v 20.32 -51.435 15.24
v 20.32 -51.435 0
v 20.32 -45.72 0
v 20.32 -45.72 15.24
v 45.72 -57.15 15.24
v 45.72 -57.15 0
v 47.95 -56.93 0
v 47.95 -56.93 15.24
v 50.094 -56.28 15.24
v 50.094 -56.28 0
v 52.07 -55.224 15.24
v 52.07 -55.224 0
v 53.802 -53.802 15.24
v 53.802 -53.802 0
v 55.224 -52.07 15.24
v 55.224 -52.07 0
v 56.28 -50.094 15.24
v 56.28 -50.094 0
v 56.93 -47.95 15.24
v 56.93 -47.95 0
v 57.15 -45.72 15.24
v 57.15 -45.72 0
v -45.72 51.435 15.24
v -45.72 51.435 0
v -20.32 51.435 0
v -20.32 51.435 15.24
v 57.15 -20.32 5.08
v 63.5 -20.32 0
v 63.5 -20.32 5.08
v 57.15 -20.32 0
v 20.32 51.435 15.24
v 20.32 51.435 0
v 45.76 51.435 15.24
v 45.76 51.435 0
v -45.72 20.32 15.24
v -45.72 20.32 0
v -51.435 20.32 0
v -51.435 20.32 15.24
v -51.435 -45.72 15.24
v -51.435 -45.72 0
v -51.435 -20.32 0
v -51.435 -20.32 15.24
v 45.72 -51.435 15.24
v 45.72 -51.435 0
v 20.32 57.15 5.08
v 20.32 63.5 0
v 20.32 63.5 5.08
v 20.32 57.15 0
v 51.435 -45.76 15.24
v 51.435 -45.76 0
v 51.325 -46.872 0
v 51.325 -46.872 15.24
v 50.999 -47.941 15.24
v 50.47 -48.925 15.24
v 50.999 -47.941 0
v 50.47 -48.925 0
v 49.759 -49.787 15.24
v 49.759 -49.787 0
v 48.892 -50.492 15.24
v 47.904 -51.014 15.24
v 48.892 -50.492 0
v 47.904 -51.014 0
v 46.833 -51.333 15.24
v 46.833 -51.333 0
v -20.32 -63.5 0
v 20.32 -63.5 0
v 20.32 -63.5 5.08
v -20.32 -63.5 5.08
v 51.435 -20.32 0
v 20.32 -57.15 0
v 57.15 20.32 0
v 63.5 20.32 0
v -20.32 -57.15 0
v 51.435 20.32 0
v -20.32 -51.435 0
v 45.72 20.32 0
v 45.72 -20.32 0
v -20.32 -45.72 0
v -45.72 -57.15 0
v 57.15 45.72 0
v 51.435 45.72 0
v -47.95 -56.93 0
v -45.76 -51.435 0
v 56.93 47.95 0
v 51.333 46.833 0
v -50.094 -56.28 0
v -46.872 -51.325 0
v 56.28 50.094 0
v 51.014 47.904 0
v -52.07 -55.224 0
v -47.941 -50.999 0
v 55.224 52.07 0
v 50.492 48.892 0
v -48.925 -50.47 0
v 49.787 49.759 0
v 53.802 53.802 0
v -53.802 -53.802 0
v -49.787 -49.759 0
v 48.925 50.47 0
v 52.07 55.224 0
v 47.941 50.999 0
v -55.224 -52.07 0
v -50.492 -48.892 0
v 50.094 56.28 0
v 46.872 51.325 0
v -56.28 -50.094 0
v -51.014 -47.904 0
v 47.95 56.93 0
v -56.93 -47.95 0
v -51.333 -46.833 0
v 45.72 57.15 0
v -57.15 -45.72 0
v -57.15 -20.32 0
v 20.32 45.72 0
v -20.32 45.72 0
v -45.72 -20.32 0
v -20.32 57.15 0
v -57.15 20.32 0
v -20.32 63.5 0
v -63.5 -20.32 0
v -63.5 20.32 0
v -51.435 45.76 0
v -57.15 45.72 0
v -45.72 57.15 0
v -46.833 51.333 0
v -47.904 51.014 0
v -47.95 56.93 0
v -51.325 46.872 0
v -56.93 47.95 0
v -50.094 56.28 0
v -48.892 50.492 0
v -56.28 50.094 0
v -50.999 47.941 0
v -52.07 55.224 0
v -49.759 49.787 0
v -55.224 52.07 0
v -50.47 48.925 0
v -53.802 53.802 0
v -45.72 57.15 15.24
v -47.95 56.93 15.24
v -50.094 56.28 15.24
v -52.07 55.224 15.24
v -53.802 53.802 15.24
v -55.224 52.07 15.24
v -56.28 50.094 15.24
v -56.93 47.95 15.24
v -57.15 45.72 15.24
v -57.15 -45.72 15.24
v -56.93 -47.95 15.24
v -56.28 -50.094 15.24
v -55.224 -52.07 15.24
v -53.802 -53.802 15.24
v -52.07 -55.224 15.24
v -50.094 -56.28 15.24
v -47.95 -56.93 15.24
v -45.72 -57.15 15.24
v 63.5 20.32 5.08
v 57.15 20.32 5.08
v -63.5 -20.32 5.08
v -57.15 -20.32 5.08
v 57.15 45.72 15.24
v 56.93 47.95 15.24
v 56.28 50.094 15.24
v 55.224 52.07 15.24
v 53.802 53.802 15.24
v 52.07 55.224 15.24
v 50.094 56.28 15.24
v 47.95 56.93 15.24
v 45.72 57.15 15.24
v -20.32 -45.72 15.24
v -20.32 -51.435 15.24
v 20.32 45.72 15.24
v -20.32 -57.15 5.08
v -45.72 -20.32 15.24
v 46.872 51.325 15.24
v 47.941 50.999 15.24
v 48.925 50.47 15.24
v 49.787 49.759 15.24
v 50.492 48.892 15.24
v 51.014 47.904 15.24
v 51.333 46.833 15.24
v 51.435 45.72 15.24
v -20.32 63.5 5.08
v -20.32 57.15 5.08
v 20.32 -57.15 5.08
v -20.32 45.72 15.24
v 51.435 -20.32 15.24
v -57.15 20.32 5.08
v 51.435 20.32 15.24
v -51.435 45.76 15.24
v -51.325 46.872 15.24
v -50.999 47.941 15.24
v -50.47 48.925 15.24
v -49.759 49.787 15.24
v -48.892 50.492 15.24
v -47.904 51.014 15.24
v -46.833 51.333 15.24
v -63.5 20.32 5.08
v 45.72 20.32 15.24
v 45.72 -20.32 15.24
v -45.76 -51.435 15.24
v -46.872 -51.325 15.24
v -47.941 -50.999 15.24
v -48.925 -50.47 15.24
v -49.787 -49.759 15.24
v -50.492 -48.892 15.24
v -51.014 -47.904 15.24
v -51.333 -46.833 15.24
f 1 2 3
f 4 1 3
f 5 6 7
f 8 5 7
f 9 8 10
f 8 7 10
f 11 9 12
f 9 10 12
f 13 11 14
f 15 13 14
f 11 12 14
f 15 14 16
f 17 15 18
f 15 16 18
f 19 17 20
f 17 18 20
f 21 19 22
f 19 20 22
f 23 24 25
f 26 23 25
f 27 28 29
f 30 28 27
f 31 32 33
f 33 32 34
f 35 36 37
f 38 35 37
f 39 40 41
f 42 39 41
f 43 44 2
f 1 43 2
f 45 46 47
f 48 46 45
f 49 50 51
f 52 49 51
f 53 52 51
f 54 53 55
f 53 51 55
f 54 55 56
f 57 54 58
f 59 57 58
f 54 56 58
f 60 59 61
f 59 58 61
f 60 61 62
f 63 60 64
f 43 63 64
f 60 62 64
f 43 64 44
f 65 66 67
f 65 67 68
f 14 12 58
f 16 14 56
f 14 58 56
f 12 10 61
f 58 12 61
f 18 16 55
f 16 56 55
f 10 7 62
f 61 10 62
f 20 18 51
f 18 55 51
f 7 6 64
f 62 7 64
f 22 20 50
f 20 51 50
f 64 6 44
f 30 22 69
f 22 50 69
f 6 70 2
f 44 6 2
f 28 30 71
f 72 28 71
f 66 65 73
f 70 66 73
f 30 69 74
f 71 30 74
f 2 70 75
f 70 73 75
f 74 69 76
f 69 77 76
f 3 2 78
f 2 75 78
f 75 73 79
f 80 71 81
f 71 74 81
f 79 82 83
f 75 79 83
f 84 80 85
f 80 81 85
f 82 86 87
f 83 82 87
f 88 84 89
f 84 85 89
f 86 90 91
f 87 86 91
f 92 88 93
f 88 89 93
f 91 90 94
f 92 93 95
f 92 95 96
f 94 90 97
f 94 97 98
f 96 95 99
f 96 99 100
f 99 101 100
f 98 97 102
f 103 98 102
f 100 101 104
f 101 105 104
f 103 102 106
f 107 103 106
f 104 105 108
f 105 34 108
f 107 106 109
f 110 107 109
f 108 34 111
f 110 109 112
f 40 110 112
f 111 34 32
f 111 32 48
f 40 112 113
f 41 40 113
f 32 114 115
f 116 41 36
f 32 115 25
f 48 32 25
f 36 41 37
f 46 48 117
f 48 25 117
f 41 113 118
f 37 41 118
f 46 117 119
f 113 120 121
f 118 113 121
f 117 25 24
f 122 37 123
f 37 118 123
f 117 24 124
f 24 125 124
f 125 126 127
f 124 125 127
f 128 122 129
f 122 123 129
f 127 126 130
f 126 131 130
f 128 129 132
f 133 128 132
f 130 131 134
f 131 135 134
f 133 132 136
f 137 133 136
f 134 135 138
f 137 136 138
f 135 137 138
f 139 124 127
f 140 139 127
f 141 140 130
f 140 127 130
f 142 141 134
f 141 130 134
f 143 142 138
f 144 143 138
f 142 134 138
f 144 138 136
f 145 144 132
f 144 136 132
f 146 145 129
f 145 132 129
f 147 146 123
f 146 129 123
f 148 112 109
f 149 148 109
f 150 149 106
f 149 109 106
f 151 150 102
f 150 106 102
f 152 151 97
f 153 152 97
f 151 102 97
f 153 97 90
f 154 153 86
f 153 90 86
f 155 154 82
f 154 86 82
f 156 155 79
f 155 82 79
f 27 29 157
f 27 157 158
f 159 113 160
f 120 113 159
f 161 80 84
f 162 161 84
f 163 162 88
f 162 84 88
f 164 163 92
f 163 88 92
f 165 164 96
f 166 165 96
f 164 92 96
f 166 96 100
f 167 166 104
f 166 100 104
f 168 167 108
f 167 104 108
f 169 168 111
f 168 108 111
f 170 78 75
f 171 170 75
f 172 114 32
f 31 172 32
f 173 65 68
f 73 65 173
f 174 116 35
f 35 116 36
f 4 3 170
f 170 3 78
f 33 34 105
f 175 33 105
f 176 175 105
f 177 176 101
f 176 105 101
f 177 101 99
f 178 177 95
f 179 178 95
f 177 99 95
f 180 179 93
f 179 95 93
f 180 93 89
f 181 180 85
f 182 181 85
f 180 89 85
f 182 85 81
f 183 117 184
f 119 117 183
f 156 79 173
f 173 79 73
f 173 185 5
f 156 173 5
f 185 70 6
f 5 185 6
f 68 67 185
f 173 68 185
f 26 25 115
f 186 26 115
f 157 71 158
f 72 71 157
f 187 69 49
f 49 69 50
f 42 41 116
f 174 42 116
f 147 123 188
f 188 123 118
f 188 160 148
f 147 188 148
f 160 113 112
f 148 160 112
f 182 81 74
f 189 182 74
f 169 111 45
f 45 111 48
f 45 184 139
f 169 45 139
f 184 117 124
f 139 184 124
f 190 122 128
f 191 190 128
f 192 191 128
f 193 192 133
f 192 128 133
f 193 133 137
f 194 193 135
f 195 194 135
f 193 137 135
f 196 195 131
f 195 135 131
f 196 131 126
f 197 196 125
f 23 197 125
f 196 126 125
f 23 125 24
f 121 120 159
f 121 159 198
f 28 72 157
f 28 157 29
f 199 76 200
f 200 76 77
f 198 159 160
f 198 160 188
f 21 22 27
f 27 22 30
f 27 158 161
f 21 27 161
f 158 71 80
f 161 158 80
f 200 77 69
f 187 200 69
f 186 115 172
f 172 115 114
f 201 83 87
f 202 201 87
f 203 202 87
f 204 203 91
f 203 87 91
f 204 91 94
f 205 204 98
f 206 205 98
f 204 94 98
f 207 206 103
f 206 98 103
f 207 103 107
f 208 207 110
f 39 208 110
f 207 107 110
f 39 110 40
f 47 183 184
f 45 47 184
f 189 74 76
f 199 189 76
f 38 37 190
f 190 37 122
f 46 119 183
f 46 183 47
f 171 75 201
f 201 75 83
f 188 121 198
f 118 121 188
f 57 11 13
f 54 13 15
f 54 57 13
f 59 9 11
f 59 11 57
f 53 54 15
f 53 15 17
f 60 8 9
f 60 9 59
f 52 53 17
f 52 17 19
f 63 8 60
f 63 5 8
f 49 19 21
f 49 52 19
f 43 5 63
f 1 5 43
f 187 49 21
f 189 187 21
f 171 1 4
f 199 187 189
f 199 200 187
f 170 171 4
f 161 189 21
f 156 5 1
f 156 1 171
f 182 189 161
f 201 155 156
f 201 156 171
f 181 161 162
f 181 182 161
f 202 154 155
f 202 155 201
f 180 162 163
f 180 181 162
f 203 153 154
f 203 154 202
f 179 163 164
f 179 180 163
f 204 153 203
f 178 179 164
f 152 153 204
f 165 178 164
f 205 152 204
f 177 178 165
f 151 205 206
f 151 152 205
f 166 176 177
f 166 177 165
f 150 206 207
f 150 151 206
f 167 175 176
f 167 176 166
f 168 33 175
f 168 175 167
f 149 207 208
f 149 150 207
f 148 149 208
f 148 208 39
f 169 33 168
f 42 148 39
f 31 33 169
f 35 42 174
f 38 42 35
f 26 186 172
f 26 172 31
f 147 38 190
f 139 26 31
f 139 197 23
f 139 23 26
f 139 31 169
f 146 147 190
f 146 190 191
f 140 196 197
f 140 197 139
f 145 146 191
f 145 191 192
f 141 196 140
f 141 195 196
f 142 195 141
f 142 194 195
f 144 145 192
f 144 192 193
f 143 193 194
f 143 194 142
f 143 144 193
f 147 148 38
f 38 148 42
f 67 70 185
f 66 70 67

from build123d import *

# Parameters (mm, degrees)
F1_DEPTH = 15.24
F0_W     = 6.35
F0_H     = 20.32
F0_W_2   = 20.32
F0_H_2   = 6.35
F2_DEPTH = 5.08
F4_COUNT = 4


with BuildPart() as f1:
    # F0 (on Top) → F1 (new body)
    with BuildSketch(Plane.XY):
        with BuildLine():
            Line((0, 45.72), (0, 57.15))
            Line((0, 57.15), (-20.32, 57.15))
            Line((-20.32, 57.15), (-45.72, 57.15))
            ThreePointArc((-45.72, 57.15), (-53.802231, 53.802231), (-57.15, 45.72))
            Line((-57.15, 45.72), (-57.15, 20.32))
            Line((-57.15, 20.32), (-51.435, 20.32))
            Line((-51.435, 20.32), (-51.435, 45.759741))
            ThreePointArc((-51.435, 45.759741), (-49.758688, 49.78683), (-45.72, 51.435))
            Line((-45.72, 51.435), (-20.32, 51.435))
            Line((-20.32, 51.435), (-20.32, 45.72))
            Line((-20.32, 45.72), (0, 45.72))
        make_face()
        Polygon((-51.435, 20.32), (-57.15, 20.32), (-57.15, 0), (-45.72, 0), (-45.72, 20.32), align=None)
    extrude(amount=F1_DEPTH)

    # F0 (on Top) → F2 (join)
    with BuildSketch(Plane.XY):
        with Locations((-60.325, 10.16)):
            Rectangle(F0_W, F0_H)
        with Locations((-10.16, 60.325)):
            Rectangle(F0_W_2, F0_H_2)
    extrude(amount=F2_DEPTH)

    # F4: F1 ×4 about axis
    f4_axis = Axis((0, 0, 51.399533), (0, 0, -1))


with BuildPart() as f1_1:
    add(f1.part)
    for i in range(1, F4_COUNT):
        add(f1.part.rotate(f4_axis, i * 360 / F4_COUNT))


solid = f1_1.part
